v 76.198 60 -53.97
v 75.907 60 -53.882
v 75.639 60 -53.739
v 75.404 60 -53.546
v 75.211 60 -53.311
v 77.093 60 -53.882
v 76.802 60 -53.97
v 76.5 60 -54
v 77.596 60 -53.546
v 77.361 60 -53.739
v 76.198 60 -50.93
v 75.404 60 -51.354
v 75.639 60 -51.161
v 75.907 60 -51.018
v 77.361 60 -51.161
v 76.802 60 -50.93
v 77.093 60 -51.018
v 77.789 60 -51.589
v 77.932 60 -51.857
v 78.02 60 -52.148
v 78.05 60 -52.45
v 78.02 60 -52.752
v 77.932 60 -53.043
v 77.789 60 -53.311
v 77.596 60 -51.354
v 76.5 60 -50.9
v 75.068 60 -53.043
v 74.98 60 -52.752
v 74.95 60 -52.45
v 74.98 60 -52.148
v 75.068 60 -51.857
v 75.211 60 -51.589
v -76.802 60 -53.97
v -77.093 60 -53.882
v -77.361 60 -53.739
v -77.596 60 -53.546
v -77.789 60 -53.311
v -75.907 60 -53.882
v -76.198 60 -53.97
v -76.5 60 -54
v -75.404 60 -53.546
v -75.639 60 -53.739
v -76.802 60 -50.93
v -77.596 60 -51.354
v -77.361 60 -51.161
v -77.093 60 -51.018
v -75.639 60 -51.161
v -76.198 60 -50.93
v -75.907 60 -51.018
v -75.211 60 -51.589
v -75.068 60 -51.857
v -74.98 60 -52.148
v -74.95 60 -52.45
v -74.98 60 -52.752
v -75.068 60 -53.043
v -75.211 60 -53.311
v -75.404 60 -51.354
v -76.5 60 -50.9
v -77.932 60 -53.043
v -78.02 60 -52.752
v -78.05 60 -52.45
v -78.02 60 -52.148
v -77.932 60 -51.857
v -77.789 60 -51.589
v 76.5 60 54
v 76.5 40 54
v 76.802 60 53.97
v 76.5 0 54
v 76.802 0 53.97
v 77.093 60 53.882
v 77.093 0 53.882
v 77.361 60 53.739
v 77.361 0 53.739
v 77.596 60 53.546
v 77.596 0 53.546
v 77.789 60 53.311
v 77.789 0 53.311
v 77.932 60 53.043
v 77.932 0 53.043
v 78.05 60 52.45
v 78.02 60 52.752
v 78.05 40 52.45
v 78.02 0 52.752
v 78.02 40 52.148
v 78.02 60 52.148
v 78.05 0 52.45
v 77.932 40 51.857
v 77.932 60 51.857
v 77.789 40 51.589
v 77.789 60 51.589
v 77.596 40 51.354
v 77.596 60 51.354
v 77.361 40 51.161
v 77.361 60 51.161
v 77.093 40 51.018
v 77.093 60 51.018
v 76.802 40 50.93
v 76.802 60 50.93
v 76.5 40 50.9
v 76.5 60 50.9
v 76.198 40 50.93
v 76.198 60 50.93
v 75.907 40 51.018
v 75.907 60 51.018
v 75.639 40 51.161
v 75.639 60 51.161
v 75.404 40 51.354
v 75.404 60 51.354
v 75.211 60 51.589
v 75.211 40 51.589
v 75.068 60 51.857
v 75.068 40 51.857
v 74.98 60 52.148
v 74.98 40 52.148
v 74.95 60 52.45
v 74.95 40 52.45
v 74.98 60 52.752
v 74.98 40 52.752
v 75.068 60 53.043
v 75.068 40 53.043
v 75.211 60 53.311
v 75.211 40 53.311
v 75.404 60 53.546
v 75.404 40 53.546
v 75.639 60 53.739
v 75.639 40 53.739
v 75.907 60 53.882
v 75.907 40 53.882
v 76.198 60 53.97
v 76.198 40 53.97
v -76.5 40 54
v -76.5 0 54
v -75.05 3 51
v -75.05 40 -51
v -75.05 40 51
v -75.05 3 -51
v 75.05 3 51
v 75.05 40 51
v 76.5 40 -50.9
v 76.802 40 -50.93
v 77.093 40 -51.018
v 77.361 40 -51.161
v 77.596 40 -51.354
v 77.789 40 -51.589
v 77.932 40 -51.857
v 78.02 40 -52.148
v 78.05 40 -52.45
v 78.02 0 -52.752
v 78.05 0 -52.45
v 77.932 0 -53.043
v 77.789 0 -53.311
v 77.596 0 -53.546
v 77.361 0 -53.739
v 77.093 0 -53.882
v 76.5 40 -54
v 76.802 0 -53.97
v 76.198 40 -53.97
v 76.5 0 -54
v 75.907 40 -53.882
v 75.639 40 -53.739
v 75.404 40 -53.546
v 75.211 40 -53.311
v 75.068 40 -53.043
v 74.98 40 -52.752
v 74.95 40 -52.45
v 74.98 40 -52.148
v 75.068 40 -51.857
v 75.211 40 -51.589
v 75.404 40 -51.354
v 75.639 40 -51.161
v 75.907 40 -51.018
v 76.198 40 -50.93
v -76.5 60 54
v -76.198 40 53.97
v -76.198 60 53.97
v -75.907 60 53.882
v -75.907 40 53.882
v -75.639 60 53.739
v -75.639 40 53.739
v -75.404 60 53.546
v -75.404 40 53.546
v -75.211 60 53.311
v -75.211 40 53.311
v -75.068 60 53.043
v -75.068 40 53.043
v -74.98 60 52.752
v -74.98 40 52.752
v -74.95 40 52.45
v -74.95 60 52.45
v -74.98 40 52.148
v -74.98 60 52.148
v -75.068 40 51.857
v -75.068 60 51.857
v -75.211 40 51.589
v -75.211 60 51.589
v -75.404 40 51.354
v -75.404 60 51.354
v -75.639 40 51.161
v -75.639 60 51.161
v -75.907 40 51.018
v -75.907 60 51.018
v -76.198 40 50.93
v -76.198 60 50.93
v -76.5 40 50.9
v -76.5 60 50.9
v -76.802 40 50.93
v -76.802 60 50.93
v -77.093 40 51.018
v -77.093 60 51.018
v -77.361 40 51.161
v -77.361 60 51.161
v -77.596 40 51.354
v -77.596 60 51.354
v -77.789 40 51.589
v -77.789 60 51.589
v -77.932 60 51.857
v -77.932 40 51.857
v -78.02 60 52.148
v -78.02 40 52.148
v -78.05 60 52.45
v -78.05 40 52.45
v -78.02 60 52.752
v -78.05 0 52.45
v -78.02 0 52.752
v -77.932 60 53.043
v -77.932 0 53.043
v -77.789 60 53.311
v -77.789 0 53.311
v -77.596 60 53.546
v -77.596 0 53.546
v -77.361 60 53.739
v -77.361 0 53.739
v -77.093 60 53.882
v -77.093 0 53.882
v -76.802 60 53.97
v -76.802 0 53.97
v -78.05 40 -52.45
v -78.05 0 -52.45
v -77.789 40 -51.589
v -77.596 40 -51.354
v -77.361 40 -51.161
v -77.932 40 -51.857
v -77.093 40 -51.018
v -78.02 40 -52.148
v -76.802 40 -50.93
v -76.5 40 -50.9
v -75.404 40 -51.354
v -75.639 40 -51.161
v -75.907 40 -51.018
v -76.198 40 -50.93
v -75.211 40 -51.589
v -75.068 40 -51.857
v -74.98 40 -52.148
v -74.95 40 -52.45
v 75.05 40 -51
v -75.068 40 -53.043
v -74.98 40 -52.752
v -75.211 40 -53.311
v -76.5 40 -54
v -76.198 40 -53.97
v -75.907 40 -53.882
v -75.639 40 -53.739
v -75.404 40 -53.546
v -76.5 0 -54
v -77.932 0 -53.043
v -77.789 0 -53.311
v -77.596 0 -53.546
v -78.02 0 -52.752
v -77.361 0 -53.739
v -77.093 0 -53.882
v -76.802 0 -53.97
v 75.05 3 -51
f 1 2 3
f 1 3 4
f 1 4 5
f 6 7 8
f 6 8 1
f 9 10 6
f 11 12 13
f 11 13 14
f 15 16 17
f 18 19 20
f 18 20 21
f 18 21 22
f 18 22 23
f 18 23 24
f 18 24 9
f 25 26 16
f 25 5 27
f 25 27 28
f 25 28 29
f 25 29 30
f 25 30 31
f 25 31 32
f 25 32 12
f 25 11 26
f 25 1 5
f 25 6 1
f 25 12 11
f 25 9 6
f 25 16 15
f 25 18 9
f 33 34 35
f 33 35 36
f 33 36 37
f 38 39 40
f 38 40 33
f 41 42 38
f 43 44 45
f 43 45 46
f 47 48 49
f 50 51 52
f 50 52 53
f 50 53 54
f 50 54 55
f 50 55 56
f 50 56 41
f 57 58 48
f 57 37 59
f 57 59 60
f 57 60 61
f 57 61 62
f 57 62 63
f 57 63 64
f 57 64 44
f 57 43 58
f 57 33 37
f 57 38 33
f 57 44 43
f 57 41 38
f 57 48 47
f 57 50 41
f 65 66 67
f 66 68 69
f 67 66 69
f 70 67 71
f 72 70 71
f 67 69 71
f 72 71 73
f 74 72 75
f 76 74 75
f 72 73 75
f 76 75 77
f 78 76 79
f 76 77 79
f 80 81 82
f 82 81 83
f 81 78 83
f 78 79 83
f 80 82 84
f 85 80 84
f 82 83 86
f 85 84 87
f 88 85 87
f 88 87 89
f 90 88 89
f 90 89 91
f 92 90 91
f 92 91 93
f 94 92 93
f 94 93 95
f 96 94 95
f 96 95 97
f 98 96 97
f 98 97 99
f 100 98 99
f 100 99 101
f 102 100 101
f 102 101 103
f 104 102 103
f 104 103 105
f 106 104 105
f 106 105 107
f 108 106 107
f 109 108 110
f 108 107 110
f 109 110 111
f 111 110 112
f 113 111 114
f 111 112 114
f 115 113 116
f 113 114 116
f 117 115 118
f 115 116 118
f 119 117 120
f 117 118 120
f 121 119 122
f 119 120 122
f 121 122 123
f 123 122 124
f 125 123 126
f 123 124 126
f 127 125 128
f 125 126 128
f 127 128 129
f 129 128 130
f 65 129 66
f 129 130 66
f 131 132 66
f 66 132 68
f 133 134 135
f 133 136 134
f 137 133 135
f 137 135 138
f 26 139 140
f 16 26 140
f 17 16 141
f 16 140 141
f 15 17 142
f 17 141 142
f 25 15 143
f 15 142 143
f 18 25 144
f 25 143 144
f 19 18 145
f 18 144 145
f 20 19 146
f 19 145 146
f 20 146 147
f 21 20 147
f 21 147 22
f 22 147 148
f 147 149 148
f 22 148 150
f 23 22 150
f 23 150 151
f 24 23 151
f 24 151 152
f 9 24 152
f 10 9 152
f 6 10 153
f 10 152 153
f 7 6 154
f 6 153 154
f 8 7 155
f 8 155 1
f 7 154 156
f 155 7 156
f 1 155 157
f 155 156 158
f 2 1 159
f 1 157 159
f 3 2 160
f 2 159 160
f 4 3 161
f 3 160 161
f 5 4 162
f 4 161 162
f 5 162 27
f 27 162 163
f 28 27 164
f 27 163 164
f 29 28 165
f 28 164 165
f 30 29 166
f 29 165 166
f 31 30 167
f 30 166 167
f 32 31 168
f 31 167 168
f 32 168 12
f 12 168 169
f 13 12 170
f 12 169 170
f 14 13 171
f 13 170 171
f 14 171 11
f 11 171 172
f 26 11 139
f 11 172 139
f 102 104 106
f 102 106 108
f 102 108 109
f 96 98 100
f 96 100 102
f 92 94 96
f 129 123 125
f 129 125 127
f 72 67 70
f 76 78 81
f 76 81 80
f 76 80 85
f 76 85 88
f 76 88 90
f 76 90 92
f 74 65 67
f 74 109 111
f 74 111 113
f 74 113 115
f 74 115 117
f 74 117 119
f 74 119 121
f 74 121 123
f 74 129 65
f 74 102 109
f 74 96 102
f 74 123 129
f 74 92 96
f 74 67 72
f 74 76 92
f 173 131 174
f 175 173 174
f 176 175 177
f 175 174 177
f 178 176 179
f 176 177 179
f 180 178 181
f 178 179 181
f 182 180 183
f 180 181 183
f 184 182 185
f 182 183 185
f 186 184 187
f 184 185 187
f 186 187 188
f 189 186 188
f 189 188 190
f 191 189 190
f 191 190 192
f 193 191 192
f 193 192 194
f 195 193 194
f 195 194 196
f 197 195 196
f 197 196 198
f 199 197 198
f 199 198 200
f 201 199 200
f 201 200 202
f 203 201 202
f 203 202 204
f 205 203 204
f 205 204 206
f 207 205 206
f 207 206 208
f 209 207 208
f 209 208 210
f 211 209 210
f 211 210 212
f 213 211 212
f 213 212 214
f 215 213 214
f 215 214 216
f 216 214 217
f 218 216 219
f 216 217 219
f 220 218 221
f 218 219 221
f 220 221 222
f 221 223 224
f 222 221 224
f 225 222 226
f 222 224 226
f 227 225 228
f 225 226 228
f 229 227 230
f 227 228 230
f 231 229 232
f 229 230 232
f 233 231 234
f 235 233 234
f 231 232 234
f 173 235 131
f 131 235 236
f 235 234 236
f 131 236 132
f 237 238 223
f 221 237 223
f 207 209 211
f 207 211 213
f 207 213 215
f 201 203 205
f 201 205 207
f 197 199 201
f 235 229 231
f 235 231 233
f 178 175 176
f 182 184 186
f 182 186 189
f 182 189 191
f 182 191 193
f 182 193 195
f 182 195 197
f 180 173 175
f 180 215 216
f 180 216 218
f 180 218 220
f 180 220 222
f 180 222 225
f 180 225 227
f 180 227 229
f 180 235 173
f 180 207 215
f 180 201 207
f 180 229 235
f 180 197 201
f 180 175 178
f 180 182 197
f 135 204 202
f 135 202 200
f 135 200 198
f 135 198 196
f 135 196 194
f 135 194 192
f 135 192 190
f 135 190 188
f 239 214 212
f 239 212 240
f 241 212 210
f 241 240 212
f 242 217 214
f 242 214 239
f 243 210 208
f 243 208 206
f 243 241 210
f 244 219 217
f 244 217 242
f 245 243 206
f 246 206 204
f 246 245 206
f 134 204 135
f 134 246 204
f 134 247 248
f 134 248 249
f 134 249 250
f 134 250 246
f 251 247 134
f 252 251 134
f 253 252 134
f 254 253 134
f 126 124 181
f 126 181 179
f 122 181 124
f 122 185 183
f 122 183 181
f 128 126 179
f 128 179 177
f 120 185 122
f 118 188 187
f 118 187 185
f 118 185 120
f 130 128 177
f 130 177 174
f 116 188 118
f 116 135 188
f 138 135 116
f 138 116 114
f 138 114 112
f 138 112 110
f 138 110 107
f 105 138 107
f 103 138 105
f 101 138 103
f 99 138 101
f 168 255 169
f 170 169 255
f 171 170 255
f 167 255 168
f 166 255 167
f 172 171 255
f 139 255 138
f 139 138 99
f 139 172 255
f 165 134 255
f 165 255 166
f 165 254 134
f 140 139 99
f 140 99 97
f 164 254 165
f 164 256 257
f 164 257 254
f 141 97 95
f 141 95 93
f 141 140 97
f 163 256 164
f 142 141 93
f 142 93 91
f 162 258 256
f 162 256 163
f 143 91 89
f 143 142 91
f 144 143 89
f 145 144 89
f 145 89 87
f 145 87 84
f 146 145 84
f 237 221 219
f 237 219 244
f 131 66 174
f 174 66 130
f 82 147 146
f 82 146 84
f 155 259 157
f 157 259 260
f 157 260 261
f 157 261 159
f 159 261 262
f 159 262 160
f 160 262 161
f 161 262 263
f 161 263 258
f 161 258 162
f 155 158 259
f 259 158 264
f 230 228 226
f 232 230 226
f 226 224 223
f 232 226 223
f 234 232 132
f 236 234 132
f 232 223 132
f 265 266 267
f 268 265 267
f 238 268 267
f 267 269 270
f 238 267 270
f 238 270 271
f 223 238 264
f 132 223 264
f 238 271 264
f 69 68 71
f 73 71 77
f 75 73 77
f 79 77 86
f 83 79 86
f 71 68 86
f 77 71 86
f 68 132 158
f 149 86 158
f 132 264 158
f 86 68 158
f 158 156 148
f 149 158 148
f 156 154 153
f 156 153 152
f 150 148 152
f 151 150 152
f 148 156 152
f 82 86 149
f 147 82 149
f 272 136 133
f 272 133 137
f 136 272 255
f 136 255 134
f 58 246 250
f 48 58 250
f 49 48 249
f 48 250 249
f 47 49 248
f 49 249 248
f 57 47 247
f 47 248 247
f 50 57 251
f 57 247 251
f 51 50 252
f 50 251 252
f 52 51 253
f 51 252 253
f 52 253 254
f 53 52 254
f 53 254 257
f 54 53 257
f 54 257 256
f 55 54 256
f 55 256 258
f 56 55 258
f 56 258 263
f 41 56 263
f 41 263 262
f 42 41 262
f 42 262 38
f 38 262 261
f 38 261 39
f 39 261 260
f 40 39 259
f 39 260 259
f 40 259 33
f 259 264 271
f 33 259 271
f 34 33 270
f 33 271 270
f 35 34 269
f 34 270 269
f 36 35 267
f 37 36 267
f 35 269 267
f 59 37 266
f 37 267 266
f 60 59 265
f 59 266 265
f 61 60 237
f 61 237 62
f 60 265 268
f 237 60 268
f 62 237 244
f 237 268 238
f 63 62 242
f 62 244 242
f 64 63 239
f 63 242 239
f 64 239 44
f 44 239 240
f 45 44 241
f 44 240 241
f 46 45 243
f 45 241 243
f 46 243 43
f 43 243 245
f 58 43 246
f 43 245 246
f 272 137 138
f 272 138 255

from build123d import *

# Parameters (mm, degrees)
SKETCH1_R             = 1.55
BOSS_EXTRUDE1_DEPTH   = 60
BOSS_EXTRUDE1_2_DEPTH = 60
BOSS_EXTRUDE1_3_DEPTH = 60
BOSS_EXTRUDE1_4_DEPTH = 60
BOSS_EXTRUDE2_DEPTH   = 40
SHELL1_T              = -3


with BuildPart() as part:
    # Sketch1 → Boss-Extrude1 (new body)
    with BuildSketch(Plane(origin=(0, 0, 0), x_dir=(1, 0, 0), z_dir=(0, 1, 0))):
        with Locations(Location((-76.5, 52.45, 0), (0, 0, 270))):
            Circle(SKETCH1_R)
    extrude(amount=BOSS_EXTRUDE1_DEPTH)



with BuildPart() as body_2:
    # Sketch1 → Boss-Extrude1 2 (new body)
    with BuildSketch(Plane(origin=(0, 0, 0), x_dir=(1, 0, 0), z_dir=(0, 1, 0))):
        with Locations(Location((76.5, 52.45, 0), (0, 0, 270))):
            Circle(SKETCH1_R)
    extrude(amount=BOSS_EXTRUDE1_2_DEPTH)


with BuildPart() as body_3:
    # Sketch1 → Boss-Extrude1 3 (new body)
    with BuildSketch(Plane(origin=(0, 0, 0), x_dir=(1, 0, 0), z_dir=(0, 1, 0))):
        with Locations(Location((76.5, -52.45, 0), (0, 0, 270))):
            Circle(SKETCH1_R)
    extrude(amount=BOSS_EXTRUDE1_3_DEPTH)


with BuildPart() as body_4:
    # Sketch1 → Boss-Extrude1 4 (new body)
    with BuildSketch(Plane(origin=(0, 0, 0), x_dir=(1, 0, 0), z_dir=(0, 1, 0))):
        with Locations(Location((-76.5, -52.45, 0), (0, 0, 270))):
            Circle(SKETCH1_R)
    extrude(amount=BOSS_EXTRUDE1_4_DEPTH)


with BuildPart() as part_1:
    add(part.part)

    add(body_2.part)  # Boss-Extrude2 merges body 2

    add(body_3.part)  # Boss-Extrude2 merges body 3

    add(body_4.part)  # Boss-Extrude2 merges body 4
    # Sketch2 → Boss-Extrude2 (add)
    with BuildSketch(Plane(origin=(0, 0, 0), x_dir=(1, 0, 0), z_dir=(0, 1, 0))):
        with BuildLine():
            Line((-78.05, 52.45), (-78.05, -52.45))
            ThreePointArc((-78.05, -52.45), (-77.596015511, -53.546015511), (-76.5, -54))
            Line((-76.5, -54), (76.5, -54))
            ThreePointArc((76.5, -54), (77.596015511, -53.546015511), (78.05, -52.45))
            Line((78.05, -52.45), (78.05, 52.45))
            ThreePointArc((78.05, 52.45), (77.596015511, 53.546015511), (76.5, 54))
            Line((76.5, 54), (-76.5, 54))
            ThreePointArc((-76.5, 54), (-77.596015511, 53.546015511), (-78.05, 52.45))
        make_face()
    extrude(amount=BOSS_EXTRUDE2_DEPTH)

    # Shell1
    shell1_openings = [part_1.faces().sort_by_distance(p)[0] for p in [
        (0, 40, 0),
    ]]
    offset(amount=SHELL1_T, openings=shell1_openings)


solid = part_1.part
